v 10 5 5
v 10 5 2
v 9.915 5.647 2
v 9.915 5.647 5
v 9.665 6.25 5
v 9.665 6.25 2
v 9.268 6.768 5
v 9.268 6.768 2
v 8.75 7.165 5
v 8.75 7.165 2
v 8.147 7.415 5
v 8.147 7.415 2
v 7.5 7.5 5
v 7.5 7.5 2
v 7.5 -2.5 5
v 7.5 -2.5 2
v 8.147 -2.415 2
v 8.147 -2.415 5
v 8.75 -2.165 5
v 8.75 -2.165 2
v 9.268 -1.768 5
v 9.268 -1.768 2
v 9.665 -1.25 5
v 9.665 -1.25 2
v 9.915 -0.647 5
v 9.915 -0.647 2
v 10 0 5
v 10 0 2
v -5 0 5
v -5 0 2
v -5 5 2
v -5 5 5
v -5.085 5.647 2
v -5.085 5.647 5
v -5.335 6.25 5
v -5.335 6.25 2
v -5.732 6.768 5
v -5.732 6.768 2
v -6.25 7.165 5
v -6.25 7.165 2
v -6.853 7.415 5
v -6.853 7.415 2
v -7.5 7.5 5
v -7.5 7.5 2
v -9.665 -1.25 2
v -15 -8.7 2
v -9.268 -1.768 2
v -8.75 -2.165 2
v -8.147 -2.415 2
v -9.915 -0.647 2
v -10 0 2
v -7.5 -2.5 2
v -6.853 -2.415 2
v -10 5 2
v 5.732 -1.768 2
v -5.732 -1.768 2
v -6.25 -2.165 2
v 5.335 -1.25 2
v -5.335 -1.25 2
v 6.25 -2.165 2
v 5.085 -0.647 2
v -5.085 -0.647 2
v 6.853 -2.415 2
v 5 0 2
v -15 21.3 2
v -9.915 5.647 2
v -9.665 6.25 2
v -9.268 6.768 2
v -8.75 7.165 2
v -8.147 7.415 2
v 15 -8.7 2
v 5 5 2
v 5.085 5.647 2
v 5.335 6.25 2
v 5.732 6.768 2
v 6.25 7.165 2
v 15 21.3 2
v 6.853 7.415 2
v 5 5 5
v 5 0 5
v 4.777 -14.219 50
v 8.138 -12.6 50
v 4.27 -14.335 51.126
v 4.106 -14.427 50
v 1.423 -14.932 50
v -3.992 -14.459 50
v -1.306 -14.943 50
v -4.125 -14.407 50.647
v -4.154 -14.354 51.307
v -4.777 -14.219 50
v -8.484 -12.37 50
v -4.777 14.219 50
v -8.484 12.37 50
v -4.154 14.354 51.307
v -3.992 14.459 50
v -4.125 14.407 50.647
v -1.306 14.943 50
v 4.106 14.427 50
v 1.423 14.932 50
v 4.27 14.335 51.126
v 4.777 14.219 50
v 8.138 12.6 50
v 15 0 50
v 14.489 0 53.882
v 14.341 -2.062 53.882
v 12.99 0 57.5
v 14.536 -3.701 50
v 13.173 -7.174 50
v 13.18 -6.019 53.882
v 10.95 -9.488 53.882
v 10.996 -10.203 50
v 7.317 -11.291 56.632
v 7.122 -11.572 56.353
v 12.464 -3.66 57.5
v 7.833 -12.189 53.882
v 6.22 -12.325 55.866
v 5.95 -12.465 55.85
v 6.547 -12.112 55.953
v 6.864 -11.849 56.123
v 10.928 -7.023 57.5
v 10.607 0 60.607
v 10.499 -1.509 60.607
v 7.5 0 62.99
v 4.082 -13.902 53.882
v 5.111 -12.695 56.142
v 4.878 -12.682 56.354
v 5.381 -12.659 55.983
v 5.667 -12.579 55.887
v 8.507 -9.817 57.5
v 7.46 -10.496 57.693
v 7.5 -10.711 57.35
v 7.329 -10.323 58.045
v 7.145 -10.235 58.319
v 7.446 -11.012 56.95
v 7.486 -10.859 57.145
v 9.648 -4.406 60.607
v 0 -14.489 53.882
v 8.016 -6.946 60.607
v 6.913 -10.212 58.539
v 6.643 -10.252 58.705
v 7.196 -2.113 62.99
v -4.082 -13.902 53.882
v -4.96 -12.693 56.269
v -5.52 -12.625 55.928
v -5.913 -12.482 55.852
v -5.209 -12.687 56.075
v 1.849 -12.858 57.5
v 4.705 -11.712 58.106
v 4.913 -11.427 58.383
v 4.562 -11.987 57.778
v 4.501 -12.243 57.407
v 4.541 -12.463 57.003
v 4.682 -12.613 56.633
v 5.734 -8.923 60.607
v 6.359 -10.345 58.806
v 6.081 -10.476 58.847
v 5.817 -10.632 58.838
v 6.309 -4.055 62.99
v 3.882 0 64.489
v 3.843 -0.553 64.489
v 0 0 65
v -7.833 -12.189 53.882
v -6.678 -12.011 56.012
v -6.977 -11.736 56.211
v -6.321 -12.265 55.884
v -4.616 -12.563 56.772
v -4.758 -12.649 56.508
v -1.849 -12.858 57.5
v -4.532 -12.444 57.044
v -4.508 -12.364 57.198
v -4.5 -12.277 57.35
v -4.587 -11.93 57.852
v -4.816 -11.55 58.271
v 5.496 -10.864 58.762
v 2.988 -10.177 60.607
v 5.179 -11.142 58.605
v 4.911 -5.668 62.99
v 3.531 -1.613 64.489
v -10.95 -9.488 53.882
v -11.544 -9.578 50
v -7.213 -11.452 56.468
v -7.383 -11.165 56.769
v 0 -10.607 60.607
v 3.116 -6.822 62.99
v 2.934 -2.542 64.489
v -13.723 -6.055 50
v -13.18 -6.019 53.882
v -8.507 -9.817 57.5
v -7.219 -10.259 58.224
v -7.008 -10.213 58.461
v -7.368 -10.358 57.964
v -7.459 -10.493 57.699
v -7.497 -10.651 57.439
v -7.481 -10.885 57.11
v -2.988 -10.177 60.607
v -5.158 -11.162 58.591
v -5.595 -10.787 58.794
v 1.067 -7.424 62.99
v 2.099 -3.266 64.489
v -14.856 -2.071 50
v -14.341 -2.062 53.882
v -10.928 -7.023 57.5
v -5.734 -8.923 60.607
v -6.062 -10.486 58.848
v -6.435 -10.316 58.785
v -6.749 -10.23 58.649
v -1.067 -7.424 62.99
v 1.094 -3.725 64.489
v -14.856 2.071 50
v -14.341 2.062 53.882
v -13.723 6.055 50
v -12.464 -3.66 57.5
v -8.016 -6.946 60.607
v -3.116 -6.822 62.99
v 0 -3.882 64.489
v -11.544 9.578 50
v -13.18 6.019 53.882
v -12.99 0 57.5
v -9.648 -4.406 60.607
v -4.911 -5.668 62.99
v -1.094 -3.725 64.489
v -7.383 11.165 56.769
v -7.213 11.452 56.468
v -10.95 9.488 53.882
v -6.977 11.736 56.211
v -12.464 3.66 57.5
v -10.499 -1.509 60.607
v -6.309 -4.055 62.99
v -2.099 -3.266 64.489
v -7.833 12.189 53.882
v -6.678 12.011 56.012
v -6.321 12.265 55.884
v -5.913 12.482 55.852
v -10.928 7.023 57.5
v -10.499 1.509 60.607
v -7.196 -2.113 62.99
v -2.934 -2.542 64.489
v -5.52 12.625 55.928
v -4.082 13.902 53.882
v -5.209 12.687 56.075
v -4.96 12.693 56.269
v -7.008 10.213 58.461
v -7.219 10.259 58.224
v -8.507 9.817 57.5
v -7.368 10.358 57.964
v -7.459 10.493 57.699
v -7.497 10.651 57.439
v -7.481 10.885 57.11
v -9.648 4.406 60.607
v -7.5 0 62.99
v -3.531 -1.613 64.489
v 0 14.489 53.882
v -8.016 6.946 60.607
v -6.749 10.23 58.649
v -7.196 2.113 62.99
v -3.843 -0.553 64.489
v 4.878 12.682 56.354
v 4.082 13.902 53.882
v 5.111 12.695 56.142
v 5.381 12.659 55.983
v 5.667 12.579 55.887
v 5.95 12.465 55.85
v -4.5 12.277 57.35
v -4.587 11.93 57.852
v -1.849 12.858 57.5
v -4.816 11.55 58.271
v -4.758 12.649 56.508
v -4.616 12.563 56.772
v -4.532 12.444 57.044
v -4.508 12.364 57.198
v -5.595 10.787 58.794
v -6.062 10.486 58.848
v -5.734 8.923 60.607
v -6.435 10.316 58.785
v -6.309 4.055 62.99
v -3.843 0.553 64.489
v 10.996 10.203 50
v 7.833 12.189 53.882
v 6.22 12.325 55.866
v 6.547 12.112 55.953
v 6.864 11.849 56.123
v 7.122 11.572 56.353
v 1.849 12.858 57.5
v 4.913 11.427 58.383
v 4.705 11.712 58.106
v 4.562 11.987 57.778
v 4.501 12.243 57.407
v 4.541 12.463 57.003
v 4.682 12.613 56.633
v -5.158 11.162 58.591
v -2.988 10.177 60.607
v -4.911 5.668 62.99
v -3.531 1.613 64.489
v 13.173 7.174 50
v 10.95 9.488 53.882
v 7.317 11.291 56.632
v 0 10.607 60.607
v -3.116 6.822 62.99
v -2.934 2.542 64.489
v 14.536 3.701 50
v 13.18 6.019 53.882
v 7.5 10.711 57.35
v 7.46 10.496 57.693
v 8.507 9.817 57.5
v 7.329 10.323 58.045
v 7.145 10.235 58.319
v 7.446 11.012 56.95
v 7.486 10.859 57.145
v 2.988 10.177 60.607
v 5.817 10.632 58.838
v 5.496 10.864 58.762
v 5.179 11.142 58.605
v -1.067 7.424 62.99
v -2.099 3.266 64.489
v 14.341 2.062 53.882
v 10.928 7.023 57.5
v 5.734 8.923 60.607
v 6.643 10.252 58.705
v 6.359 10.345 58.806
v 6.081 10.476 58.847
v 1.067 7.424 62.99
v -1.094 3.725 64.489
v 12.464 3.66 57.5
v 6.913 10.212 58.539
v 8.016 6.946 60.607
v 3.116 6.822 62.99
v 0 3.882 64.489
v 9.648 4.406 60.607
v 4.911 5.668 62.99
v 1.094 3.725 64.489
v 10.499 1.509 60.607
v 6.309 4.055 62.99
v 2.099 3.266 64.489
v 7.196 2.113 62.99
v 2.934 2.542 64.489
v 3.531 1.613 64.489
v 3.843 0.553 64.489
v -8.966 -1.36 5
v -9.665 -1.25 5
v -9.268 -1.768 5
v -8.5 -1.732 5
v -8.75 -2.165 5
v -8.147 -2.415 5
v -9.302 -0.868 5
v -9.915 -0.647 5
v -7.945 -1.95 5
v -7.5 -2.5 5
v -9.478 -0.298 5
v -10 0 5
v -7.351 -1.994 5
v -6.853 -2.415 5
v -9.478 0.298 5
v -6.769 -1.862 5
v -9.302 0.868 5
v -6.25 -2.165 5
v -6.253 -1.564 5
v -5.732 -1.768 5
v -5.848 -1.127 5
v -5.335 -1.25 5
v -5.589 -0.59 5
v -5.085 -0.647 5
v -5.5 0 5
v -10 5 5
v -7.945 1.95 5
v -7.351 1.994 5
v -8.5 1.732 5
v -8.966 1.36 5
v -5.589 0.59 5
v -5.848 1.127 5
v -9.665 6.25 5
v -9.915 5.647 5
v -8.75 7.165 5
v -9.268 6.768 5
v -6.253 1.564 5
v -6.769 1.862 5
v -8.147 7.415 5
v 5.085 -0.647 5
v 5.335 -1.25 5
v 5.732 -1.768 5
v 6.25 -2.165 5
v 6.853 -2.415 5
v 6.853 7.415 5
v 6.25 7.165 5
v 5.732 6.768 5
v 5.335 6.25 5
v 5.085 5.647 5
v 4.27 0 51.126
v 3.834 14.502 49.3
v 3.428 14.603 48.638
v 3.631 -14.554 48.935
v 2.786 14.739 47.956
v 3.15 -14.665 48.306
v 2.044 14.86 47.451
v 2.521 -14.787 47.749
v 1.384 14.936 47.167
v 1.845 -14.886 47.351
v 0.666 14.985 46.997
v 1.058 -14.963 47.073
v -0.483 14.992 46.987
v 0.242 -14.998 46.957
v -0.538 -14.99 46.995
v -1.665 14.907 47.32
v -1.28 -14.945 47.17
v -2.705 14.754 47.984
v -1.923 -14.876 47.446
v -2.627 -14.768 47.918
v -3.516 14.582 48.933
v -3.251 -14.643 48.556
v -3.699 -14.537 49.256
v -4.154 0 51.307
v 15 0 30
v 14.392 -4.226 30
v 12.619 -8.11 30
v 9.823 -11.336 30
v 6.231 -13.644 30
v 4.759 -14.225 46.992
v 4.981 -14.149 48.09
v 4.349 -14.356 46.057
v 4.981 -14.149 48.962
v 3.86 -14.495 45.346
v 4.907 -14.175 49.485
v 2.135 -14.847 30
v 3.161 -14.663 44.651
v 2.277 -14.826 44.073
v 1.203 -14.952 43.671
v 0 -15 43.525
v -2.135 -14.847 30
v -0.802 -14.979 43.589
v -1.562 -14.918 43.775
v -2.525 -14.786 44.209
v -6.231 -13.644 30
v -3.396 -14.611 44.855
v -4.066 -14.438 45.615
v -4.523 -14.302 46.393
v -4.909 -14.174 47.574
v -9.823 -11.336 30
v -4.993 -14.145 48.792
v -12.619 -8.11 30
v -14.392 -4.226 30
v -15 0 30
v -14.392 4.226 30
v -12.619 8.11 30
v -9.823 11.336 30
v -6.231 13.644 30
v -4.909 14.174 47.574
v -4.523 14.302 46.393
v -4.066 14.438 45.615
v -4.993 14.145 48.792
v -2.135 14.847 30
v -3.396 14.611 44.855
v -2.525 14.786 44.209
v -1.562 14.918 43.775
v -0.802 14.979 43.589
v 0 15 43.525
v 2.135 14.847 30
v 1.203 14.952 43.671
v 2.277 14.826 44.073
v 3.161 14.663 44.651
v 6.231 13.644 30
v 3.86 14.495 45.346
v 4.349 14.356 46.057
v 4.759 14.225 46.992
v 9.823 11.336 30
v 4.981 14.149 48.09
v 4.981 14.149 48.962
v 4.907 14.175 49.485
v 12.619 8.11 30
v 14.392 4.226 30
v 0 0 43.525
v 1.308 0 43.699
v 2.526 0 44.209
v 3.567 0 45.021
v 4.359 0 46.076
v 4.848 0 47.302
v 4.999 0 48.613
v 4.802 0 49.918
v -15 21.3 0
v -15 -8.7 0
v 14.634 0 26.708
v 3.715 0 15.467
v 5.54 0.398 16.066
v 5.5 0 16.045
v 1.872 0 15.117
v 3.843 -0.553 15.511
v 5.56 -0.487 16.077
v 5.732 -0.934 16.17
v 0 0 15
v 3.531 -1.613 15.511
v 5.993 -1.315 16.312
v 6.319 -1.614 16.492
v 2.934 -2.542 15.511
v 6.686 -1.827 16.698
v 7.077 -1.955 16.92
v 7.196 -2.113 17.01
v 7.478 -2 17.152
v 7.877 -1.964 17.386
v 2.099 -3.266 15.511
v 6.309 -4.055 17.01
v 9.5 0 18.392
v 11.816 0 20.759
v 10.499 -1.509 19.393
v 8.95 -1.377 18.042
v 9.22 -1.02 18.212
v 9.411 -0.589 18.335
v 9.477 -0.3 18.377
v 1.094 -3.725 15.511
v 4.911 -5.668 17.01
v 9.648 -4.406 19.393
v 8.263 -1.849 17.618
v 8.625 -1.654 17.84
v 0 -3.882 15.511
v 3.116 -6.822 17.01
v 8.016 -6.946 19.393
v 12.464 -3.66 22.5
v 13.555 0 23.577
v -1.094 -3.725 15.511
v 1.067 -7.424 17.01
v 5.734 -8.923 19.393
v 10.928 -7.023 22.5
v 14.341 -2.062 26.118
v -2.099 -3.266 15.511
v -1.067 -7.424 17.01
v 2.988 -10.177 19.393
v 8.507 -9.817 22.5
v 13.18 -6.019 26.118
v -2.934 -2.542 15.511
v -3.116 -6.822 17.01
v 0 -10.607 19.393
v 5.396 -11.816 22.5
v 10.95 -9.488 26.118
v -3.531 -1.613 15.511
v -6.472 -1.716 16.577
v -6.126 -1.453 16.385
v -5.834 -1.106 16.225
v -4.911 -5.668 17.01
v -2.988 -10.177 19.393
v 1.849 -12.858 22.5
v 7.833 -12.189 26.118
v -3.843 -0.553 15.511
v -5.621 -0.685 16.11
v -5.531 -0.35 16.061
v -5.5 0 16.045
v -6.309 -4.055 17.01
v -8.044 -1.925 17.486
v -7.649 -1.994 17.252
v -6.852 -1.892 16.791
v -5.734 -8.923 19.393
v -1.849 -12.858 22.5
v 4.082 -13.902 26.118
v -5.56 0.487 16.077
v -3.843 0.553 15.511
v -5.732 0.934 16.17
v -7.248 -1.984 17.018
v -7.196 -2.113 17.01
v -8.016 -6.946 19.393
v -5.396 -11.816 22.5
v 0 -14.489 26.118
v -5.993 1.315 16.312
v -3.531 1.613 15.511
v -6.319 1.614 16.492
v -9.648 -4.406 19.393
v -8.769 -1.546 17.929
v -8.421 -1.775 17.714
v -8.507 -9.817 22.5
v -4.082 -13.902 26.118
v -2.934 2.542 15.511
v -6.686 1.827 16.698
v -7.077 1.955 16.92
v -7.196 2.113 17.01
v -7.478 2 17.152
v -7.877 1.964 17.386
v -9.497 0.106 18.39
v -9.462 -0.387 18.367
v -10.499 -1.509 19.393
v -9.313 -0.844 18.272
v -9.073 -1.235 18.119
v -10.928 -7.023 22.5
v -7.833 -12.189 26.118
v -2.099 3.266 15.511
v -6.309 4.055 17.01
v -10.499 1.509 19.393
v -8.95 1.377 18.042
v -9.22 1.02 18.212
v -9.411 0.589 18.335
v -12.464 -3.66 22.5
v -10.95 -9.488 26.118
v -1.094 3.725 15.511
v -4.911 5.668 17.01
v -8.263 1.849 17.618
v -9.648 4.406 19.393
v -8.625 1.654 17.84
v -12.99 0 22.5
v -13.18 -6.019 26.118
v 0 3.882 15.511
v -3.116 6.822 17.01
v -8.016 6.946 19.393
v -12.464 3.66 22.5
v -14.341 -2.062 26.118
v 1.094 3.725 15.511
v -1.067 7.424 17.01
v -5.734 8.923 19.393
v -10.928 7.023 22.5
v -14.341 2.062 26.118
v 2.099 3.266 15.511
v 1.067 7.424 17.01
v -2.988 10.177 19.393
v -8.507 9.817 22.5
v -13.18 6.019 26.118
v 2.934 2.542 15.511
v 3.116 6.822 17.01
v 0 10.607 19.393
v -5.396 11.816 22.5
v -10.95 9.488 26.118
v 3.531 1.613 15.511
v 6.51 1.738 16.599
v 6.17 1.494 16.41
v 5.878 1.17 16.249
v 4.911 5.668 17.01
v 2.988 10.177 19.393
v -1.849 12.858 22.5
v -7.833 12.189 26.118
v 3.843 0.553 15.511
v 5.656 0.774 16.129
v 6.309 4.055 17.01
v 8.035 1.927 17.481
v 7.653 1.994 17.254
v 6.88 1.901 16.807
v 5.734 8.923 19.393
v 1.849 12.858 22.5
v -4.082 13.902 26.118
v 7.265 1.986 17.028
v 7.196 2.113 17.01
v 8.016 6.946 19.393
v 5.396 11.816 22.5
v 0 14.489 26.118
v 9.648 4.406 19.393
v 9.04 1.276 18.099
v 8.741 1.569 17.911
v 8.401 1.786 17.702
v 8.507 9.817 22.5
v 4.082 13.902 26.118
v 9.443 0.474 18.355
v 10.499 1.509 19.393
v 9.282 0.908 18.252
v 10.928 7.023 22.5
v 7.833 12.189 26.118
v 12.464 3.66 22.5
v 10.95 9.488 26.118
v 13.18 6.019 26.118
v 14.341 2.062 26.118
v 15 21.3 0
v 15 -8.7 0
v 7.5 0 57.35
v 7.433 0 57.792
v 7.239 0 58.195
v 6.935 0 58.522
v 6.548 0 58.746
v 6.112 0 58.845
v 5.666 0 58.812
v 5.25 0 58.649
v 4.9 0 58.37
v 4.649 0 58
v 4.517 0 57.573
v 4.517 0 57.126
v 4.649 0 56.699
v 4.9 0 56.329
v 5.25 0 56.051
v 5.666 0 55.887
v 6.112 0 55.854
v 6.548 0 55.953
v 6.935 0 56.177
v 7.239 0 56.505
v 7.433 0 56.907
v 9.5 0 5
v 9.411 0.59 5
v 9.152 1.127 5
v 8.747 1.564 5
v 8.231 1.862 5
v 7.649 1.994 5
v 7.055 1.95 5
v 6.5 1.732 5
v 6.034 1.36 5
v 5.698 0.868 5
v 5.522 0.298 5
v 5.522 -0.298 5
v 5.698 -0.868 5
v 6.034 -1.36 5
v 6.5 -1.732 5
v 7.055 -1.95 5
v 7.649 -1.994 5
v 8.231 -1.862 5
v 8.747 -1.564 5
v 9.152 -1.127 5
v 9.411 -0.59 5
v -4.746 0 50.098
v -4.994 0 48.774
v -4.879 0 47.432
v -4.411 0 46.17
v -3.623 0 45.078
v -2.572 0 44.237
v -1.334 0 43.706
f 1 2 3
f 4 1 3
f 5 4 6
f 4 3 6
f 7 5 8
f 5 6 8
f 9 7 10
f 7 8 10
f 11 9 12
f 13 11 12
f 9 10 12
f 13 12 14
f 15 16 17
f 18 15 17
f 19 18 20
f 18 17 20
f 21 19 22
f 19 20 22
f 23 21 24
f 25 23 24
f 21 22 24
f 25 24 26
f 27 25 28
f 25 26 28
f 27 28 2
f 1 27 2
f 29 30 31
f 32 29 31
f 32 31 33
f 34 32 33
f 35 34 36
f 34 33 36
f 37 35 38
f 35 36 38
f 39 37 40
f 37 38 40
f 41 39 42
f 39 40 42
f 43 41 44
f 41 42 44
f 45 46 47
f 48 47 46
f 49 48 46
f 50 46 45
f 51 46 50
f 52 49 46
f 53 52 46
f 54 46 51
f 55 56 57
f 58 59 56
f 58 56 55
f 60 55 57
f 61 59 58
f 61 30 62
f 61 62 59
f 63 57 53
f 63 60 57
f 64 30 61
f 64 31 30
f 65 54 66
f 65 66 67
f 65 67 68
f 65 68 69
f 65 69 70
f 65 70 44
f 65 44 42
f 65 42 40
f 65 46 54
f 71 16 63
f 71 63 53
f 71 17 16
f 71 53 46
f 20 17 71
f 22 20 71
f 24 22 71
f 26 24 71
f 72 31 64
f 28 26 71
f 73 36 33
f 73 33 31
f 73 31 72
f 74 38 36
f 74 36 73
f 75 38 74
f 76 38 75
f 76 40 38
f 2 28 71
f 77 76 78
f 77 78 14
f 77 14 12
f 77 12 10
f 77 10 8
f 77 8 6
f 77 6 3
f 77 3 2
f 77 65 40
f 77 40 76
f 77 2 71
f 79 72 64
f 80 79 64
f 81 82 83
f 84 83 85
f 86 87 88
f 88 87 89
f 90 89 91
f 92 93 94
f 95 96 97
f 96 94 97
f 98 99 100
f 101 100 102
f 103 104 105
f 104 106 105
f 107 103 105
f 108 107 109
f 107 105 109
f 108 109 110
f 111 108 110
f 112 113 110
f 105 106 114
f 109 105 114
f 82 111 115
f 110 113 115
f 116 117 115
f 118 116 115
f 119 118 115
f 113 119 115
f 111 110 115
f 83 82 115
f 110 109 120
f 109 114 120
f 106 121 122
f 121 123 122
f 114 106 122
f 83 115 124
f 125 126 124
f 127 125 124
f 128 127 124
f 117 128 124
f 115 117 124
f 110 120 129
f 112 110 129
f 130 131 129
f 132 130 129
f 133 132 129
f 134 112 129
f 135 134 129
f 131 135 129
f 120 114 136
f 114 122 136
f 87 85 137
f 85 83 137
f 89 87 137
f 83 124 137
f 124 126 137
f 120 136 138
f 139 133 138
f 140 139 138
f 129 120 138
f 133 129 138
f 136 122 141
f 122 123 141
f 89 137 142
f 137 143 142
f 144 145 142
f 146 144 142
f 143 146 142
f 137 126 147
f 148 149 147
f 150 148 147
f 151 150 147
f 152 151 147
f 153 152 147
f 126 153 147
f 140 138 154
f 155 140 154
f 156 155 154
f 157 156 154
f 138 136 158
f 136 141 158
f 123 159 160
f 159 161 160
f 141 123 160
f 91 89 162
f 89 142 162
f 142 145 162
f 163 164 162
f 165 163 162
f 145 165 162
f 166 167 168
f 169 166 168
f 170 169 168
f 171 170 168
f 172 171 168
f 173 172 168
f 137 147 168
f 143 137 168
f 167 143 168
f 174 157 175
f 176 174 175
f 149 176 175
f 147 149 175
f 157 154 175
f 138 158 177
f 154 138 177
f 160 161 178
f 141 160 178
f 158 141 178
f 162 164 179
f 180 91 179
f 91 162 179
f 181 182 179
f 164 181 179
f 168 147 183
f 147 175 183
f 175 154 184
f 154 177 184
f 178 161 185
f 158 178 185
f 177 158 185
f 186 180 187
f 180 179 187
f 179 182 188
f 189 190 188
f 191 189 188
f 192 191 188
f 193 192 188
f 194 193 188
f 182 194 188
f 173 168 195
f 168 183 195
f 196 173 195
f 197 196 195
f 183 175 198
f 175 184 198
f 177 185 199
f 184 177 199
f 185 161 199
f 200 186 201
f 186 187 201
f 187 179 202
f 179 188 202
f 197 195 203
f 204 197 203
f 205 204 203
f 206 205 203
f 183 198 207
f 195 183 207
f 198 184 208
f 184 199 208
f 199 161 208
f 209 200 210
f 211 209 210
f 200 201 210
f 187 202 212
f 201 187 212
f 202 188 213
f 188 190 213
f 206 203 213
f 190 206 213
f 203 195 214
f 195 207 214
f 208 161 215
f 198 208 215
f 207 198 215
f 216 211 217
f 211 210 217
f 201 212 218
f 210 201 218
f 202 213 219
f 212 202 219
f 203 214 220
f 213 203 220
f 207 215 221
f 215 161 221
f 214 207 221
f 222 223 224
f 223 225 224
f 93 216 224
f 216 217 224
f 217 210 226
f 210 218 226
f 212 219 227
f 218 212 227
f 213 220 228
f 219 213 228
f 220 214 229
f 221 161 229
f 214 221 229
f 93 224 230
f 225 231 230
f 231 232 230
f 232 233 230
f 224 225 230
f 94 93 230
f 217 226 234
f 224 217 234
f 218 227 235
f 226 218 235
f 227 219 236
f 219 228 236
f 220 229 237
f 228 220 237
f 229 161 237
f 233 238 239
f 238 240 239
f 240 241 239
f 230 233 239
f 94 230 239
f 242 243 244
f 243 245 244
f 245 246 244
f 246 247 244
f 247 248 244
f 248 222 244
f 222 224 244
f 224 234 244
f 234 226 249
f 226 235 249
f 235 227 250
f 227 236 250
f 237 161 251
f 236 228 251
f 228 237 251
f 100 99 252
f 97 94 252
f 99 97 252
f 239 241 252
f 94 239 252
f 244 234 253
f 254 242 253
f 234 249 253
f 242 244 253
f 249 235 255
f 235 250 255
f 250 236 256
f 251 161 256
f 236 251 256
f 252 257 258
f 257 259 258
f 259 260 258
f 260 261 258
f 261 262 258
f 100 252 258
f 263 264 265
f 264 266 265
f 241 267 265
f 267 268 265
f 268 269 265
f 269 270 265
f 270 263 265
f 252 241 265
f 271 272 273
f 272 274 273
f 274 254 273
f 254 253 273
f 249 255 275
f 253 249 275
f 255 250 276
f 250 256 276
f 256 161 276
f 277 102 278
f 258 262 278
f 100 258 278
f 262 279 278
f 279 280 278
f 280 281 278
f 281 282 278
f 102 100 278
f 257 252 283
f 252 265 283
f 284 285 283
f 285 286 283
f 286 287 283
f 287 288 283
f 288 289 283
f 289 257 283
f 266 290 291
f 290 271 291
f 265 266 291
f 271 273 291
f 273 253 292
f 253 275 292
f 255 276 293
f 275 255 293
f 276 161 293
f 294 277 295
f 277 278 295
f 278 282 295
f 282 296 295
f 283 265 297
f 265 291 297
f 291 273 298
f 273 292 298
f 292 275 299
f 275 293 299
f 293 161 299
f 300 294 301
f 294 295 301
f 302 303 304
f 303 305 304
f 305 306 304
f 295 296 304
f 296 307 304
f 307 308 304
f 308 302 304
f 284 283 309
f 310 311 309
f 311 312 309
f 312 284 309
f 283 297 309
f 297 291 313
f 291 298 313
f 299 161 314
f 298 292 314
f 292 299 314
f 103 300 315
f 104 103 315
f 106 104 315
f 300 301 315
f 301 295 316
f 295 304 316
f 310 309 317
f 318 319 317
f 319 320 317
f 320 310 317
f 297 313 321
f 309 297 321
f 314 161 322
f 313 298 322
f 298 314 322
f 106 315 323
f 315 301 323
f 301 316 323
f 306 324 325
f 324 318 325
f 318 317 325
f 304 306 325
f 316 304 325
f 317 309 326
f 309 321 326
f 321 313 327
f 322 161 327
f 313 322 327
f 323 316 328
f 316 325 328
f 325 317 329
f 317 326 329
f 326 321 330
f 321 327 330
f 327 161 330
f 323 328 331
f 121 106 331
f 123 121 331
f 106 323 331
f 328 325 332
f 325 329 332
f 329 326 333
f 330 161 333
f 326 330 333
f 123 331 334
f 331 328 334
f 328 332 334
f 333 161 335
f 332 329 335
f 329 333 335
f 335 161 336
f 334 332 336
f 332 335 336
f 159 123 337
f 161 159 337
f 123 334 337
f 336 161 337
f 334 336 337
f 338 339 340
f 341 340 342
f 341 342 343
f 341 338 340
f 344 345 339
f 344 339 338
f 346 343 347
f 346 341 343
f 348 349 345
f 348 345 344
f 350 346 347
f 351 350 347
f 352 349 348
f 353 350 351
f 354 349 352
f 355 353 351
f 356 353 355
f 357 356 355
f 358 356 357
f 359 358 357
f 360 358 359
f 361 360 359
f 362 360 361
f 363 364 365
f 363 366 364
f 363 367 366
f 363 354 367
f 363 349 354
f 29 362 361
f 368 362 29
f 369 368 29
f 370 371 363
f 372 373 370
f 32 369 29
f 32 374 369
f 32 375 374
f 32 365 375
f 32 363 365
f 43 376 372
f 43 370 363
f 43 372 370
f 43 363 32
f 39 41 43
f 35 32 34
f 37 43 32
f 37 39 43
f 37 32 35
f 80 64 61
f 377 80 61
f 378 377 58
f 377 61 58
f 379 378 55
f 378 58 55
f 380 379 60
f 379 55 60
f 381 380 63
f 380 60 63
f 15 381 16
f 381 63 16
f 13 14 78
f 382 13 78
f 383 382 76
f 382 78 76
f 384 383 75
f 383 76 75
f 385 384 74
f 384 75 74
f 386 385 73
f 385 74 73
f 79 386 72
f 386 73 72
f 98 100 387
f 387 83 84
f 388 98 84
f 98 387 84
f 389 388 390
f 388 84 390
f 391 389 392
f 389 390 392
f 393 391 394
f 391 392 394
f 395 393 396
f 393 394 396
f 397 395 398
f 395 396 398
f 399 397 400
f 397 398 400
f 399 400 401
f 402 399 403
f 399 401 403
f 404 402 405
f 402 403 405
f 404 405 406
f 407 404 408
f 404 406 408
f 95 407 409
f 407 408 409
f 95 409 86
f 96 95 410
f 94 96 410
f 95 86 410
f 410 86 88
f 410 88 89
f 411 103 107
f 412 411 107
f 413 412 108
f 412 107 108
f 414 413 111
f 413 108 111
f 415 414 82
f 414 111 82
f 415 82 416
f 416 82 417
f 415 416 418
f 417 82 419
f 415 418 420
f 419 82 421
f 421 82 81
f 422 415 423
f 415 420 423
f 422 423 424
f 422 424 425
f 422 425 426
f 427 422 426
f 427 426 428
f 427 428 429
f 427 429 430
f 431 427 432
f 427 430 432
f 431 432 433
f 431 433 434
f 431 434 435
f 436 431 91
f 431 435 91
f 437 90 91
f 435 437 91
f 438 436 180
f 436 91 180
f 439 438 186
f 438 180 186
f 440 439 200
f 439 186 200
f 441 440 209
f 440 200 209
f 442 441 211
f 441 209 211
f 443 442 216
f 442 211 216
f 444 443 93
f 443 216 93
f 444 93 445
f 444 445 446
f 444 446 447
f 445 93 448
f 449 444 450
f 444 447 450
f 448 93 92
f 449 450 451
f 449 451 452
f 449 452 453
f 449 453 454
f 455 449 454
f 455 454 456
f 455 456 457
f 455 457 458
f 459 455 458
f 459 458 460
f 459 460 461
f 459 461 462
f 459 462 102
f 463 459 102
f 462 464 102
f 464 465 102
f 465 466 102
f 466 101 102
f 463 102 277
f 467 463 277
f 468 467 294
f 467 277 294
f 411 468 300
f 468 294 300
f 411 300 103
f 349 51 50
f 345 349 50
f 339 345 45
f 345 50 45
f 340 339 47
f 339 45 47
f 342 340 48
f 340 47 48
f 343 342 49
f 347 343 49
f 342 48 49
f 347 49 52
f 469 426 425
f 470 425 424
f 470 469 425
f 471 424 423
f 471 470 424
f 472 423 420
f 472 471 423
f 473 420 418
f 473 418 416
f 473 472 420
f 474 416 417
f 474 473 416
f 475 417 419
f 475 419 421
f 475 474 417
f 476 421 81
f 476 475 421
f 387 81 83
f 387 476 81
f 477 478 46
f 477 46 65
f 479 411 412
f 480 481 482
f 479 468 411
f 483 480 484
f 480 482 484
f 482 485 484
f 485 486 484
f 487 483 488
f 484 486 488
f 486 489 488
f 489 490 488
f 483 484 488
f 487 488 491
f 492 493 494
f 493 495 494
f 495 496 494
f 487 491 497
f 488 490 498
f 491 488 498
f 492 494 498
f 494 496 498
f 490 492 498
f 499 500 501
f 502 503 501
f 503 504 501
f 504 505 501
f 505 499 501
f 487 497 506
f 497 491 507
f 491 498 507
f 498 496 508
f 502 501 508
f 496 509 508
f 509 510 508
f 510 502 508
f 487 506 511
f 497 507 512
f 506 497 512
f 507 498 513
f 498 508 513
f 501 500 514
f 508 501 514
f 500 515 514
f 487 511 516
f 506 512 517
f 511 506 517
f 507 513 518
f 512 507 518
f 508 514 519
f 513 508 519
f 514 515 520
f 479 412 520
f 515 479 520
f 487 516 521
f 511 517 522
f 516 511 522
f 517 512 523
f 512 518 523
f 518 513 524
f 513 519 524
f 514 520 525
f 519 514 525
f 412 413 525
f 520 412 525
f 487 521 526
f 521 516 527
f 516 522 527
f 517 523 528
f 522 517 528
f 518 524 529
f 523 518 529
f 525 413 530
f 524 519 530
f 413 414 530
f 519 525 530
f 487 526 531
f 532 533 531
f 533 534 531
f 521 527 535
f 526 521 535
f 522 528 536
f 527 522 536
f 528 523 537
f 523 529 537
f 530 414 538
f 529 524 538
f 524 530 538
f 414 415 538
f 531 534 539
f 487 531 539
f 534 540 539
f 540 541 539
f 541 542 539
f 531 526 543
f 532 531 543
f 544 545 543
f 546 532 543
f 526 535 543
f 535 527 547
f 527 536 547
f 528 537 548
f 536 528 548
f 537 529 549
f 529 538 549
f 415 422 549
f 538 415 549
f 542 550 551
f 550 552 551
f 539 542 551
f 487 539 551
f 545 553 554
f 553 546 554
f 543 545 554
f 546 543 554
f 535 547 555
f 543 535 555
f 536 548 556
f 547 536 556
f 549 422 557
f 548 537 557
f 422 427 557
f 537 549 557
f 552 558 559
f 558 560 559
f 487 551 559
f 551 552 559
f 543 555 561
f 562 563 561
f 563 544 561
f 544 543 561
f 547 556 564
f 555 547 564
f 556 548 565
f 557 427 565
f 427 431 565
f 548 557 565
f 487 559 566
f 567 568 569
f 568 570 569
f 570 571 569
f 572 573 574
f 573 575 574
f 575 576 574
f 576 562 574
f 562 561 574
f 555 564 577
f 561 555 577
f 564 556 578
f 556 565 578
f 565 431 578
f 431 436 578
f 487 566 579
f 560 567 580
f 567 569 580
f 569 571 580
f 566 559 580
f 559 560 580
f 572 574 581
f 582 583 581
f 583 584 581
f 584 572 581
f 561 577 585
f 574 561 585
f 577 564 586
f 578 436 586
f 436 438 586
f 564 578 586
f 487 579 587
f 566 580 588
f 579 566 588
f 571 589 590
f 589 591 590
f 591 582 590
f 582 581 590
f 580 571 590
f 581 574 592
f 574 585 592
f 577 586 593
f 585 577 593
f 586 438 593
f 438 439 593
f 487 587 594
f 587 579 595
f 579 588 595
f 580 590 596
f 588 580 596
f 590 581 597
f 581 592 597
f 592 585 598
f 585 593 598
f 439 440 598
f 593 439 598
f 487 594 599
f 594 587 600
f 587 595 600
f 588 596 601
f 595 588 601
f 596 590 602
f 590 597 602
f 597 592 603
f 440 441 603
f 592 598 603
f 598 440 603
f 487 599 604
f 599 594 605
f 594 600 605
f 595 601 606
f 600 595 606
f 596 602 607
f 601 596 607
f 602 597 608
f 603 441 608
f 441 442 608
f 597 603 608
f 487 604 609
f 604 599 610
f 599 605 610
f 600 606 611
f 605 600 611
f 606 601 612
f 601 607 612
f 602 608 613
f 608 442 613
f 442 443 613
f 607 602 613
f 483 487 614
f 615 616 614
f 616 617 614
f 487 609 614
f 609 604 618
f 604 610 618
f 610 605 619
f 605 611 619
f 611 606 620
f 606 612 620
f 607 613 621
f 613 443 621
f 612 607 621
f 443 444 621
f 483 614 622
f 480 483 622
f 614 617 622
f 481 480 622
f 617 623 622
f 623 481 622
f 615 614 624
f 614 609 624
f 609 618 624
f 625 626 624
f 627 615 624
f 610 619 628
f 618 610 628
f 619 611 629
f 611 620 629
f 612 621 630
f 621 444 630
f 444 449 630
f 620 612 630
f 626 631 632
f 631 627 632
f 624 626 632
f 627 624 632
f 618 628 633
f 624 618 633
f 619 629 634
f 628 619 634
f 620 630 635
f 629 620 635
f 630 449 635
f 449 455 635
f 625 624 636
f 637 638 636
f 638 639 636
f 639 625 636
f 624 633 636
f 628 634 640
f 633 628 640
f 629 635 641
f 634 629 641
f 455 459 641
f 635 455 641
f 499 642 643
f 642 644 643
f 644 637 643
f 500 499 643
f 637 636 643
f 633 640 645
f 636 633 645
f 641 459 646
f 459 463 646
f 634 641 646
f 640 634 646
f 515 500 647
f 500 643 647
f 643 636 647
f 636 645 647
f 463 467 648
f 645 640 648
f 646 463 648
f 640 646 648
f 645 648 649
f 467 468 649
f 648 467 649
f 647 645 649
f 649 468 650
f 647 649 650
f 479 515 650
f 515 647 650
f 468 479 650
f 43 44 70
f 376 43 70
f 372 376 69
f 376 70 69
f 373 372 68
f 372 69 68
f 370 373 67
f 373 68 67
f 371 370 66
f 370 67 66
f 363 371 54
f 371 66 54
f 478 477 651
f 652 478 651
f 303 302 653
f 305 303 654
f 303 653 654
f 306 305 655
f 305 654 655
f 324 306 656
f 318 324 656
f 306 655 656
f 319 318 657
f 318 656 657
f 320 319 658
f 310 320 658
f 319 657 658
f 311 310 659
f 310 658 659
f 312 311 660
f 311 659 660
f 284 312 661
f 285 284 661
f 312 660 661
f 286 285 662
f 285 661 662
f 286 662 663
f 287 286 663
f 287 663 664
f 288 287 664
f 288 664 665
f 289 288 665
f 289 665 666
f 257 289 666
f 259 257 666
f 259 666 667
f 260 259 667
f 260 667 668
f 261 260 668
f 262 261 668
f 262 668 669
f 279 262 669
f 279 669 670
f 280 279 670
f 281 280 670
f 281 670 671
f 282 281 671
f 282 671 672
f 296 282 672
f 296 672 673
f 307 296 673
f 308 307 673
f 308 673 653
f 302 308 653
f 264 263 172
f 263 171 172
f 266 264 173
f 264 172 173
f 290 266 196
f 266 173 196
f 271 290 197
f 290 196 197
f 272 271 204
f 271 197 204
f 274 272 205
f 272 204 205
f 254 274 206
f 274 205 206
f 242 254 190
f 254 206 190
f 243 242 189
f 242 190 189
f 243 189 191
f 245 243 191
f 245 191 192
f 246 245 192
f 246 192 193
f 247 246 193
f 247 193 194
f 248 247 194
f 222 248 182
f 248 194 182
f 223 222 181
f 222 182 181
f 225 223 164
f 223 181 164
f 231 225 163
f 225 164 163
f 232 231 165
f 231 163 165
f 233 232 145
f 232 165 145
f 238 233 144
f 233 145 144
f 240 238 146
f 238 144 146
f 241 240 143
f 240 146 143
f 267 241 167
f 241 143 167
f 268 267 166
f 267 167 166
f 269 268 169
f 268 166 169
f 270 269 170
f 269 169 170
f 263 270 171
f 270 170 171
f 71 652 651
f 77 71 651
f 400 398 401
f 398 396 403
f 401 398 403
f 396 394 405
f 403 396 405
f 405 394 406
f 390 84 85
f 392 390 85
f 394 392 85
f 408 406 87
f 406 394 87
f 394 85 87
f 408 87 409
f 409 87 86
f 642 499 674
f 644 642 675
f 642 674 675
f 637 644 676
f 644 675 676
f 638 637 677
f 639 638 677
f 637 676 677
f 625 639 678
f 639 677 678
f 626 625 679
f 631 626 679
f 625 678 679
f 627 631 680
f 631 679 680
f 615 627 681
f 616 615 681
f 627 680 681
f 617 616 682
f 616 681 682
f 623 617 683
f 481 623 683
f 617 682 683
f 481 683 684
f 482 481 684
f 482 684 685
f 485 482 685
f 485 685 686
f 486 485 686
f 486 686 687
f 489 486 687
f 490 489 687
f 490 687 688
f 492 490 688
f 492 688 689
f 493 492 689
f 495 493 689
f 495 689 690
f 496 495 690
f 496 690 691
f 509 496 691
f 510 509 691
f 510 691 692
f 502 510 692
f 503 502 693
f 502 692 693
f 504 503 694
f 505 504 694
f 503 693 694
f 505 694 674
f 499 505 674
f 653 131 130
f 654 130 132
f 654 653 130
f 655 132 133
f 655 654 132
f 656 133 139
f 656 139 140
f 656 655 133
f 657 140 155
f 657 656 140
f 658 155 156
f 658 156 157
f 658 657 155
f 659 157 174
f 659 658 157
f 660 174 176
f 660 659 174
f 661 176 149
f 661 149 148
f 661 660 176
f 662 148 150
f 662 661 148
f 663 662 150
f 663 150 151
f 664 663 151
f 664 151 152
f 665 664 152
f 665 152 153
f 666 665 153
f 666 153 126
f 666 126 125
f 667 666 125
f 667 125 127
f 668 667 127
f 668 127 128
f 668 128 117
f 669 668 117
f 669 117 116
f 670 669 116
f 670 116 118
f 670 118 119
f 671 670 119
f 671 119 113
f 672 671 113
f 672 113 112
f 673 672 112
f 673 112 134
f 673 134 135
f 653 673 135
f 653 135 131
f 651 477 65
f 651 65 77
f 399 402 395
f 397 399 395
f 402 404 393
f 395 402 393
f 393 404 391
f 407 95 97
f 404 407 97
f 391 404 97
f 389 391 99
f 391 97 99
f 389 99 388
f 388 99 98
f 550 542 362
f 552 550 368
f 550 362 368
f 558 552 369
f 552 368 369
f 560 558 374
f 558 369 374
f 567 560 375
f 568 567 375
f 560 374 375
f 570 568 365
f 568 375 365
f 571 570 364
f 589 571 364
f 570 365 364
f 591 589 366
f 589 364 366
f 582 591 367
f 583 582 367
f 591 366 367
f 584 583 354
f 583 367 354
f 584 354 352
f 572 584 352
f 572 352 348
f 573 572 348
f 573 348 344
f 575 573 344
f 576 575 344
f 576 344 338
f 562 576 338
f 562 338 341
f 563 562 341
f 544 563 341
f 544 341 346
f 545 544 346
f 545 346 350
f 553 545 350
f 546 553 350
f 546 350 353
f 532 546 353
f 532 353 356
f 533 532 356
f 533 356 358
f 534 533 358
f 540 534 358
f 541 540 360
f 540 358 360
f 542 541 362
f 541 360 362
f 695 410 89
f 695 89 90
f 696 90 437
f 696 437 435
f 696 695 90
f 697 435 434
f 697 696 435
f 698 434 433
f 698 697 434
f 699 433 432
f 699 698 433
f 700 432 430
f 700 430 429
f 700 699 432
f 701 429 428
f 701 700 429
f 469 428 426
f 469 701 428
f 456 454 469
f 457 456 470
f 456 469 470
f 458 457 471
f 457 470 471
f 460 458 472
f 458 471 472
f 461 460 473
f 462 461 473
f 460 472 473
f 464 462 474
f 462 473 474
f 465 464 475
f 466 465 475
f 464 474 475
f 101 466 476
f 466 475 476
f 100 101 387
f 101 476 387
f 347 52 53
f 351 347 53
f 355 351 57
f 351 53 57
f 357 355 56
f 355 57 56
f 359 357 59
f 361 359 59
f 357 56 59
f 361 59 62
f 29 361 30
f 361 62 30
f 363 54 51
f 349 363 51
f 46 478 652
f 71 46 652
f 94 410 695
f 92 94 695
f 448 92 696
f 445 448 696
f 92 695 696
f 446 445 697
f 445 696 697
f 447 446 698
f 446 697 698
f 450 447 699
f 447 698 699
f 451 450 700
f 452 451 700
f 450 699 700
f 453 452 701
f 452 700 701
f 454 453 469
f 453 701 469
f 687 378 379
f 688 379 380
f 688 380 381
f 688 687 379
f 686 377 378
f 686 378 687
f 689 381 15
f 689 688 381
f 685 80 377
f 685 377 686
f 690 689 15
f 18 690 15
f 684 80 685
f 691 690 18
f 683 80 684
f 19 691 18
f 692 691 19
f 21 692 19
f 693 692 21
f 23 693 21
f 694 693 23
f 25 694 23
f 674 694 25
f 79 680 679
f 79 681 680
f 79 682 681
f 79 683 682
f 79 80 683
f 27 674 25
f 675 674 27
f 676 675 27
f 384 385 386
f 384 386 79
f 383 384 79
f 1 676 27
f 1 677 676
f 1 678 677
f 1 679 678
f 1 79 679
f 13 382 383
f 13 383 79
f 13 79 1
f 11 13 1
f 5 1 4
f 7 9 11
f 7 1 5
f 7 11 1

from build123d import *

# Parameters (mm, degrees)
F0_W     = 30
F0_H     = 30
F1_DEPTH = 2
F0_R     = 2
F3_DEPTH = 5
F4_DEPTH = 25
F2_R     = 1.5
F6_DEPTH = 15
F7_DEPTH = 15


# Not quite as in the source:
# - a feature names something its author has since deleted; it is built from what else it names


with BuildPart() as f1:
    # F0 (on Top) → F1 (new body)
    with BuildSketch(Plane.XY):
        with Locations((0, 6.2995284576)):
            Rectangle(F0_W, F0_H)
        with BuildLine():
            ThreePointArc((-10, 5), (-9.267766953, 6.767766953), (-7.5, 7.5))
            ThreePointArc((-7.5, 7.5), (-5.732233047, 6.767766953), (-5, 5))
            Line((-5, 5), (-5, 0))
            ThreePointArc((-5, 0), (-5.732233047, -1.767766953), (-7.5, -2.5))
            ThreePointArc((-7.5, -2.5), (-9.267766953, -1.767766953), (-10, 0))
            Line((-10, 0), (-10, 5))
        make_face(mode=Mode.SUBTRACT)
        with BuildLine():
            Line((5, 0), (5, 5))
            ThreePointArc((5, 5), (5.732233047, 6.767766953), (7.5, 7.5))
            ThreePointArc((7.5, 7.5), (9.267766953, 6.767766953), (10, 5))
            Line((10, 5), (10, 0))
            ThreePointArc((10, 0), (9.267766953, -1.767766953), (7.5, -2.5))
            ThreePointArc((7.5, -2.5), (5.732233047, -1.767766953), (5, 0))
        make_face(mode=Mode.SUBTRACT)
    extrude(amount=F1_DEPTH)

    # F0 (on Top) → F3 (join)
    with BuildSketch(Plane.XY):
        with BuildLine():
            ThreePointArc((7.5, 7.5), (5.732233047, 6.767766953), (5, 5))
            Line((5, 5), (5, 0))
            ThreePointArc((5, 0), (5.732233047, -1.767766953), (7.5, -2.5))
            ThreePointArc((7.5, -2.5), (9.267766953, -1.767766953), (10, 0))
            Line((10, 0), (10, 5))
            ThreePointArc((10, 5), (9.267766953, 6.767766953), (7.5, 7.5))
        make_face()
        with Locations((7.5, 0)):
            Circle(F0_R, mode=Mode.SUBTRACT)
        with BuildLine():
            ThreePointArc((-5, 5), (-5.732233047, 6.767766953), (-7.5, 7.5))
            ThreePointArc((-7.5, 7.5), (-9.267766953, 6.767766953), (-10, 5))
            Line((-10, 5), (-10, 0))
            ThreePointArc((-10, 0), (-9.267766953, -1.767766953), (-7.5, -2.5))
            ThreePointArc((-7.5, -2.5), (-5.732233047, -1.767766953), (-5, 0))
            Line((-5, 0), (-5, 5))
        make_face()
        with Locations((-7.5, 0)):
            Circle(F0_R, mode=Mode.SUBTRACT)
    extrude(amount=F3_DEPTH)

    # F0 (on Top) → F4 (join)
    with BuildSketch(Plane.XY):
        with Locations((7.5, 0)):
            Circle(F0_R)
        with Locations((-7.5, 0)):
            Circle(F0_R)
    extrude(amount=F4_DEPTH)

    # F2 (on Front) → F5 (revolve)
    with BuildSketch(Plane.XZ):
        with BuildLine():
            ThreePointArc((15, 50), (10.6066017178, 60.6066017178), (0, 65))
            Line((0, 65), (0, 46.9528951543))
            ThreePointArc((0, 46.9528951543), (3.0017193367, 48.1526751529), (4.2698885231, 51.1261475231))
            ThreePointArc((4.2698885231, 51.1261475231), (4.3593428406, 46.0758998678), (0, 43.5245995224))
            Line((0, 43.5245995224), (0, 15))
            ThreePointArc((0, 15), (10.6066017178, 19.3933982822), (15, 30))
            Line((15, 30), (15, 50))
        make_face()
        with Locations((6, 57.3495886624)):
            Circle(F2_R, mode=Mode.SUBTRACT)
        with Locations((6, 57.3495886624)):
            Circle(F2_R)
        with BuildLine():
            ThreePointArc((4.2698885231, 51.1261475231), (3.0017193367, 48.1526751529), (0, 46.9528951543))
            Line((0, 46.9528951543), (0, 43.5245995224))
            ThreePointArc((0, 43.5245995224), (4.3593428406, 46.0758998678), (4.2698885231, 51.1261475231))
        make_face()
    revolve(axis=Axis((0, 0, 40), (0, 0, -1)))

    # F2 (on Front) → F6 (cut, symmetric)
    with BuildSketch(Plane.XZ):
        with Locations((6, 57.3495886624)):
            Circle(F2_R)
        with Locations((-6, 57.3495886624)):
            Circle(F2_R)
    extrude(amount=F6_DEPTH, both=True, mode=Mode.SUBTRACT)

    # F2 (on Front) → F7 (cut, symmetric)
    with BuildSketch(Plane.XZ):
        with BuildLine():
            ThreePointArc((4.2698885231, 51.1261475231), (3.0017193367, 48.1526751529), (0, 46.9528951543))
            Line((0, 46.9528951543), (0, 43.5245995224))
            ThreePointArc((0, 43.5245995224), (4.3593428406, 46.0758998678), (4.2698885231, 51.1261475231))
        make_face()
        with BuildLine():
            Line((0, 43.5245995224), (0, 46.9528951543))
            ThreePointArc((0, 46.9528951543), (-2.9917232596, 48.2573678623), (-4.1542744288, 51.3070452037))
            ThreePointArc((-4.1542744288, 51.3070452037), (-4.4109085463, 46.1700537495), (0, 43.5245995224))
        make_face()
    extrude(amount=F7_DEPTH, both=True, mode=Mode.SUBTRACT)


solid = f1.part
